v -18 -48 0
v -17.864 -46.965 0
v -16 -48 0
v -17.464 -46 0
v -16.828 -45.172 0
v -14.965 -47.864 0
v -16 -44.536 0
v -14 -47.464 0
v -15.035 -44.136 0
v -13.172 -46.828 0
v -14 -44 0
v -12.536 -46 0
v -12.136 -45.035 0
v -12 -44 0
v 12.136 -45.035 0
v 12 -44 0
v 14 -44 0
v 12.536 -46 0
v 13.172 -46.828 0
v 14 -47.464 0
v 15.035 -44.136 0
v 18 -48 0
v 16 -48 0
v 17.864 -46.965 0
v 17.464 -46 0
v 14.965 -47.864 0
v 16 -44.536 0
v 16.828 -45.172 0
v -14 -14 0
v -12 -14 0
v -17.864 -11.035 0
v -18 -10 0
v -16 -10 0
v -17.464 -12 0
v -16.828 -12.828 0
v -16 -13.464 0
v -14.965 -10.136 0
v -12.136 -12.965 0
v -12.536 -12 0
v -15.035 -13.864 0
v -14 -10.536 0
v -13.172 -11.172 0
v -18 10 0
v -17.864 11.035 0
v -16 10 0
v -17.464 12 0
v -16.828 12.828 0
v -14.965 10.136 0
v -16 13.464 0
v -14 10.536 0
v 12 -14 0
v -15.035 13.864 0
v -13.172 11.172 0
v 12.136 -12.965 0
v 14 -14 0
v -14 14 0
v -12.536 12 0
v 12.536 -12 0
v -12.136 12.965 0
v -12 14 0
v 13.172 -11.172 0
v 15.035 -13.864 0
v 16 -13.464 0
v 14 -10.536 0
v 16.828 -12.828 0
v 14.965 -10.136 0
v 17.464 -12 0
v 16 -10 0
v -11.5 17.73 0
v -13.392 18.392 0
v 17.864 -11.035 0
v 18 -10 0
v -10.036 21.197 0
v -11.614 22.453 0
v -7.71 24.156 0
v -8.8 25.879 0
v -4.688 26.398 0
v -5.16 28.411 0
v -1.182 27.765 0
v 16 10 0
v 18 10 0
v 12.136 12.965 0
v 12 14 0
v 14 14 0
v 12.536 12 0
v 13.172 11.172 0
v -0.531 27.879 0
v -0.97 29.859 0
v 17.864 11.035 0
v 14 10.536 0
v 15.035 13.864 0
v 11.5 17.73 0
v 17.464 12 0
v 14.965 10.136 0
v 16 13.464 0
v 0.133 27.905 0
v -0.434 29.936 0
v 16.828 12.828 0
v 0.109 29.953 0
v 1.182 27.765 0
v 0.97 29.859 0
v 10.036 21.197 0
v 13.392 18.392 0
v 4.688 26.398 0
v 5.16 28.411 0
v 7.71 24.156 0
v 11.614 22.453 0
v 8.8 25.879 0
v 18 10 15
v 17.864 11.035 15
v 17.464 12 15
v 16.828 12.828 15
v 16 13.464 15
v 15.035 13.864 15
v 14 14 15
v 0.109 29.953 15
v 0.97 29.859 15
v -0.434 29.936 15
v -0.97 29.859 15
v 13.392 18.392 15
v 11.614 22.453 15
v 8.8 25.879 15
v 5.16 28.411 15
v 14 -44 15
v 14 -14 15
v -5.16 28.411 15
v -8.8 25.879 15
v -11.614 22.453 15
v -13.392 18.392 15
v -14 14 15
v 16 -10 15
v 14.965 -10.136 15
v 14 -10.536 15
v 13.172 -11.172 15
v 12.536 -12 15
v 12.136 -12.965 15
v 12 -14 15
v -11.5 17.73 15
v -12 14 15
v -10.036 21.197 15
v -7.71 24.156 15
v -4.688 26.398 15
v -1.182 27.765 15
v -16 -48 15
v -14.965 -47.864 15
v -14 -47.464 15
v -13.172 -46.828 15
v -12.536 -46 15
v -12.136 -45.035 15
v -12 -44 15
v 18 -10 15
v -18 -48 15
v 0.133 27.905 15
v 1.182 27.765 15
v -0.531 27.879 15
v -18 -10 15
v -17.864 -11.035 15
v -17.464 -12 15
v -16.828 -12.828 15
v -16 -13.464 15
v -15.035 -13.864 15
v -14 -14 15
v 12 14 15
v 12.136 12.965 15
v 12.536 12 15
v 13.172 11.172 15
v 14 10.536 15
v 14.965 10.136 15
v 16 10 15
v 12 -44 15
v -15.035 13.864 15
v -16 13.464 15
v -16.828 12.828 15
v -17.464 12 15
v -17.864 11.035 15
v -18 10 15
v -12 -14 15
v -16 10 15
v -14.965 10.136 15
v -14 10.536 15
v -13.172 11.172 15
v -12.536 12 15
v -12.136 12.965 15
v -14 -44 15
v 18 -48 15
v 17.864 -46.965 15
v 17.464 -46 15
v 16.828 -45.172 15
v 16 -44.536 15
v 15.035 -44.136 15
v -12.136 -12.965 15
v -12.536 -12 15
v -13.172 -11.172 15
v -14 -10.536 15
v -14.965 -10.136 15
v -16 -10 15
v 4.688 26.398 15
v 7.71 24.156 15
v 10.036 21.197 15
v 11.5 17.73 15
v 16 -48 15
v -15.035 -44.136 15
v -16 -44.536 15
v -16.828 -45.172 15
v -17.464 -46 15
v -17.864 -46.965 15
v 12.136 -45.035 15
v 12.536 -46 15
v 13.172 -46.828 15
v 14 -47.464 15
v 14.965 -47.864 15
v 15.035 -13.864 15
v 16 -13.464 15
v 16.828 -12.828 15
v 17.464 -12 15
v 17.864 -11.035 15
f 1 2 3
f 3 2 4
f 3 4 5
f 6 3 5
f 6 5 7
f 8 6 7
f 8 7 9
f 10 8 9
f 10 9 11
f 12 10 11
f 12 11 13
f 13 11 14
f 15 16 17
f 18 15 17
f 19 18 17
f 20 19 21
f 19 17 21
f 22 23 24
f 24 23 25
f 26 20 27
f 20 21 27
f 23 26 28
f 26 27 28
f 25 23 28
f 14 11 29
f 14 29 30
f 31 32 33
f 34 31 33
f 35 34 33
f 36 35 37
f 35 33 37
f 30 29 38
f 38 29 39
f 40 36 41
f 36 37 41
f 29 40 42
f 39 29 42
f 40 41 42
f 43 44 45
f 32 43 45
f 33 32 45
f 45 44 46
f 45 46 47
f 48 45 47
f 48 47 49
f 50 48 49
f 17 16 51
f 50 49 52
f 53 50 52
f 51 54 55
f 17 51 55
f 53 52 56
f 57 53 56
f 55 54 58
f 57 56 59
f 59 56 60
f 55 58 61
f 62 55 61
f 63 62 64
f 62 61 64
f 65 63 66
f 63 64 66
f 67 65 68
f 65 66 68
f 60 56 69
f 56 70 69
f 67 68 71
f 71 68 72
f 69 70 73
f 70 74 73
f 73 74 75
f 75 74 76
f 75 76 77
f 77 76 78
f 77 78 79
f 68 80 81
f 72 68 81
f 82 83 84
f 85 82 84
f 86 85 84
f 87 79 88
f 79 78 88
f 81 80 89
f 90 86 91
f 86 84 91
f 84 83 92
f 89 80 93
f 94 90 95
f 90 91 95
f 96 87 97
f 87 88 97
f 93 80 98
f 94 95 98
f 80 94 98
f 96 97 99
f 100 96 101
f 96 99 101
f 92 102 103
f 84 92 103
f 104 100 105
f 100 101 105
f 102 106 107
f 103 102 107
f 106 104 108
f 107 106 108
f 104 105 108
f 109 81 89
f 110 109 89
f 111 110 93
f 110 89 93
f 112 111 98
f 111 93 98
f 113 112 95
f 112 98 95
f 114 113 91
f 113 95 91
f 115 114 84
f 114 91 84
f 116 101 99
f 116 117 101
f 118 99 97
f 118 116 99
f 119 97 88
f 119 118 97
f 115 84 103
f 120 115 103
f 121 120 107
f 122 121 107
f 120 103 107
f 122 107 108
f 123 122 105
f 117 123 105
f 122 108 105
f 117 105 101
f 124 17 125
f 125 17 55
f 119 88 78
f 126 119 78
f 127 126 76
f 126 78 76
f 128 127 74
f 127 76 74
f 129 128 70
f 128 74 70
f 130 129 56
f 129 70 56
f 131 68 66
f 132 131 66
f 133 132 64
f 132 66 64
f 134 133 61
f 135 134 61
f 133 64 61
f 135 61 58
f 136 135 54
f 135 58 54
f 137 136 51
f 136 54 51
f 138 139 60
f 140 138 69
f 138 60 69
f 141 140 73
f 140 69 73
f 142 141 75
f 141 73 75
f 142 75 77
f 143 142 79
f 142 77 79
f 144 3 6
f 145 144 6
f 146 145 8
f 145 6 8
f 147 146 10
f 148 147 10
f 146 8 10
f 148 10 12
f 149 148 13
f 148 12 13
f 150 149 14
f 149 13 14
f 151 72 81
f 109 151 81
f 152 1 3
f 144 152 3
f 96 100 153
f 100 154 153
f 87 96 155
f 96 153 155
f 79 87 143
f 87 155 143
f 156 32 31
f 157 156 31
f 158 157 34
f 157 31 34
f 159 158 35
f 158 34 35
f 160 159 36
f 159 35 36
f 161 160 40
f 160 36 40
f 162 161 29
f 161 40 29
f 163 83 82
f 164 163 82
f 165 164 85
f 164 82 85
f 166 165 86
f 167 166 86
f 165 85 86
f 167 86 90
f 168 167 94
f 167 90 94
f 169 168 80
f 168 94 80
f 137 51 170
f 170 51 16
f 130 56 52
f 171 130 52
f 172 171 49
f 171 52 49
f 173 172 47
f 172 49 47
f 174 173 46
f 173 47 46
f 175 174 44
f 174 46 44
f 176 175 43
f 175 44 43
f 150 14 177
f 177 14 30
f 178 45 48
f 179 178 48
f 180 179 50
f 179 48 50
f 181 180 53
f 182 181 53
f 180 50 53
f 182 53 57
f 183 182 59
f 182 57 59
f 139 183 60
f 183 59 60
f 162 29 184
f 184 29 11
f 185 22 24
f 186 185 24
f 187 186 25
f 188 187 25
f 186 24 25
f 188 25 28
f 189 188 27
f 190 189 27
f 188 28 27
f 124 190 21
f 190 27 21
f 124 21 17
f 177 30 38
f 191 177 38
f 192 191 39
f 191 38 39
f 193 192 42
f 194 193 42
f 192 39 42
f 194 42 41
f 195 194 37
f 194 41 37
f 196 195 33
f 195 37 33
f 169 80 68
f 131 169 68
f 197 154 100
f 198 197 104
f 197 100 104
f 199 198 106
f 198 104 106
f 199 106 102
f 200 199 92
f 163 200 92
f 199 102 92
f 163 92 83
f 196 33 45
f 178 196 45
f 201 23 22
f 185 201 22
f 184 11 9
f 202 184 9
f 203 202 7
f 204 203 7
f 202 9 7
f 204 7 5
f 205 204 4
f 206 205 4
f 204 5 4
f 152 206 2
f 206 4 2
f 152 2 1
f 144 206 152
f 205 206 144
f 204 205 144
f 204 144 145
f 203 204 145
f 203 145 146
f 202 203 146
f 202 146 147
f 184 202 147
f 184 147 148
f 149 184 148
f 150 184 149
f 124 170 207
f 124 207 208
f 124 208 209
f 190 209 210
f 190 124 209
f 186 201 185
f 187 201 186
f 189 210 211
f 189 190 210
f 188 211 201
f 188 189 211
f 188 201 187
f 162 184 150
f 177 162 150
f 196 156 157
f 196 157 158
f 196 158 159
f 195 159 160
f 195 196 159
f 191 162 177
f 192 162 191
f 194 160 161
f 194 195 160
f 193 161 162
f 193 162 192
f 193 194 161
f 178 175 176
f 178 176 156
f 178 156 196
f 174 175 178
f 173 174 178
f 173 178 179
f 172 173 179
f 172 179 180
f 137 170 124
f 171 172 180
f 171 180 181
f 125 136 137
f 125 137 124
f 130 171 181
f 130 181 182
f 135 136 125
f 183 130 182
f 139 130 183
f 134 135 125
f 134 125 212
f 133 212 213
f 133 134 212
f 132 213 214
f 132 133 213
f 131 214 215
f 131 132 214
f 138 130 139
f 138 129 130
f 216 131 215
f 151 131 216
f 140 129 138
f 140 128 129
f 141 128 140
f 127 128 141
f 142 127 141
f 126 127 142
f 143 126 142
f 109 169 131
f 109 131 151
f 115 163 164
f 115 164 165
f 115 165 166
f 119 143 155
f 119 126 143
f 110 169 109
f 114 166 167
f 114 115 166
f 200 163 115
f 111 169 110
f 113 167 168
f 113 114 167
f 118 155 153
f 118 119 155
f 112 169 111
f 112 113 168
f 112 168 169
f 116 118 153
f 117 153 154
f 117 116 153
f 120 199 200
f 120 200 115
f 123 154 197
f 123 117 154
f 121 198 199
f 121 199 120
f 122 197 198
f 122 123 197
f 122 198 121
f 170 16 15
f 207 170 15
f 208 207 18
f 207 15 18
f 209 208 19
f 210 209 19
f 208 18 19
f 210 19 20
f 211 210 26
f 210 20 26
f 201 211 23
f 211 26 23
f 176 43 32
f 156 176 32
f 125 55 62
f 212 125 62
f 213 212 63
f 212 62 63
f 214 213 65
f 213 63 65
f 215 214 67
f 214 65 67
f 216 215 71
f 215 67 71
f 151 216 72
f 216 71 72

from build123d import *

# Parameters (mm, degrees)
F2_DEPTH = 15
F3_R     = 5


with BuildPart() as f2:
    # F1 (on Top) → F2 (new body)
    with BuildSketch(Plane.XY):
        with BuildLine():
            Line((0, 30), (0, 28))
            ThreePointArc((0, 28), (8.589469, 23.219544), (12, 14))
            ThreePointArc((12, 14), (13.171573, 11.171573), (16, 10))
            Line((16, 10), (16, -10))
            ThreePointArc((16, -10), (13.171573, -11.171573), (12, -14))
            Line((12, -14), (12, -44))
            ThreePointArc((12, -44), (13.171573, -46.828427), (16, -48))
            Line((16, -48), (18, -48))
            ThreePointArc((18, -48), (16.828427, -45.171573), (14, -44))
            Line((14, -44), (14, -14))
            ThreePointArc((14, -14), (16.828427, -12.828427), (18, -10))
            Line((18, -10), (18, 10))
            ThreePointArc((18, 10), (16.828427, 12.828427), (14, 14))
            ThreePointArc((14, 14), (10.107982, 24.521127), (0.305882, 29.976471))
            Line((0.305882, 29.976471), (0, 30))
        make_face()
        with BuildLine():
            Line((-16, -10), (-16, 10))
            ThreePointArc((-16, 10), (-13.171573, 11.171573), (-12, 14))
            ThreePointArc((-12, 14), (-8.589469, 23.219544), (0, 28))
            Line((0, 28), (0, 30))
            Line((0, 30), (-0.305882, 29.976471))
            ThreePointArc((-0.305882, 29.976471), (-10.107982, 24.521127), (-14, 14))
            ThreePointArc((-14, 14), (-16.828427, 12.828427), (-18, 10))
            Line((-18, 10), (-18, -10))
            ThreePointArc((-18, -10), (-16.828427, -12.828427), (-14, -14))
            Line((-14, -14), (-14, -44))
            ThreePointArc((-14, -44), (-16.828427, -45.171573), (-18, -48))
            Line((-18, -48), (-16, -48))
            ThreePointArc((-16, -48), (-13.171573, -46.828427), (-12, -44))
            Line((-12, -44), (-12, -14))
            ThreePointArc((-12, -14), (-13.171573, -11.171573), (-16, -10))
        make_face()
    extrude(amount=F2_DEPTH)

    # F3
    f3_edges = [f2.edges().sort_by_distance(p)[0] for p in [
        (0, 30, 7.5),
        (0, 28, 7.5),
    ]]
    fillet(f3_edges, radius=F3_R)


solid = f2.part
